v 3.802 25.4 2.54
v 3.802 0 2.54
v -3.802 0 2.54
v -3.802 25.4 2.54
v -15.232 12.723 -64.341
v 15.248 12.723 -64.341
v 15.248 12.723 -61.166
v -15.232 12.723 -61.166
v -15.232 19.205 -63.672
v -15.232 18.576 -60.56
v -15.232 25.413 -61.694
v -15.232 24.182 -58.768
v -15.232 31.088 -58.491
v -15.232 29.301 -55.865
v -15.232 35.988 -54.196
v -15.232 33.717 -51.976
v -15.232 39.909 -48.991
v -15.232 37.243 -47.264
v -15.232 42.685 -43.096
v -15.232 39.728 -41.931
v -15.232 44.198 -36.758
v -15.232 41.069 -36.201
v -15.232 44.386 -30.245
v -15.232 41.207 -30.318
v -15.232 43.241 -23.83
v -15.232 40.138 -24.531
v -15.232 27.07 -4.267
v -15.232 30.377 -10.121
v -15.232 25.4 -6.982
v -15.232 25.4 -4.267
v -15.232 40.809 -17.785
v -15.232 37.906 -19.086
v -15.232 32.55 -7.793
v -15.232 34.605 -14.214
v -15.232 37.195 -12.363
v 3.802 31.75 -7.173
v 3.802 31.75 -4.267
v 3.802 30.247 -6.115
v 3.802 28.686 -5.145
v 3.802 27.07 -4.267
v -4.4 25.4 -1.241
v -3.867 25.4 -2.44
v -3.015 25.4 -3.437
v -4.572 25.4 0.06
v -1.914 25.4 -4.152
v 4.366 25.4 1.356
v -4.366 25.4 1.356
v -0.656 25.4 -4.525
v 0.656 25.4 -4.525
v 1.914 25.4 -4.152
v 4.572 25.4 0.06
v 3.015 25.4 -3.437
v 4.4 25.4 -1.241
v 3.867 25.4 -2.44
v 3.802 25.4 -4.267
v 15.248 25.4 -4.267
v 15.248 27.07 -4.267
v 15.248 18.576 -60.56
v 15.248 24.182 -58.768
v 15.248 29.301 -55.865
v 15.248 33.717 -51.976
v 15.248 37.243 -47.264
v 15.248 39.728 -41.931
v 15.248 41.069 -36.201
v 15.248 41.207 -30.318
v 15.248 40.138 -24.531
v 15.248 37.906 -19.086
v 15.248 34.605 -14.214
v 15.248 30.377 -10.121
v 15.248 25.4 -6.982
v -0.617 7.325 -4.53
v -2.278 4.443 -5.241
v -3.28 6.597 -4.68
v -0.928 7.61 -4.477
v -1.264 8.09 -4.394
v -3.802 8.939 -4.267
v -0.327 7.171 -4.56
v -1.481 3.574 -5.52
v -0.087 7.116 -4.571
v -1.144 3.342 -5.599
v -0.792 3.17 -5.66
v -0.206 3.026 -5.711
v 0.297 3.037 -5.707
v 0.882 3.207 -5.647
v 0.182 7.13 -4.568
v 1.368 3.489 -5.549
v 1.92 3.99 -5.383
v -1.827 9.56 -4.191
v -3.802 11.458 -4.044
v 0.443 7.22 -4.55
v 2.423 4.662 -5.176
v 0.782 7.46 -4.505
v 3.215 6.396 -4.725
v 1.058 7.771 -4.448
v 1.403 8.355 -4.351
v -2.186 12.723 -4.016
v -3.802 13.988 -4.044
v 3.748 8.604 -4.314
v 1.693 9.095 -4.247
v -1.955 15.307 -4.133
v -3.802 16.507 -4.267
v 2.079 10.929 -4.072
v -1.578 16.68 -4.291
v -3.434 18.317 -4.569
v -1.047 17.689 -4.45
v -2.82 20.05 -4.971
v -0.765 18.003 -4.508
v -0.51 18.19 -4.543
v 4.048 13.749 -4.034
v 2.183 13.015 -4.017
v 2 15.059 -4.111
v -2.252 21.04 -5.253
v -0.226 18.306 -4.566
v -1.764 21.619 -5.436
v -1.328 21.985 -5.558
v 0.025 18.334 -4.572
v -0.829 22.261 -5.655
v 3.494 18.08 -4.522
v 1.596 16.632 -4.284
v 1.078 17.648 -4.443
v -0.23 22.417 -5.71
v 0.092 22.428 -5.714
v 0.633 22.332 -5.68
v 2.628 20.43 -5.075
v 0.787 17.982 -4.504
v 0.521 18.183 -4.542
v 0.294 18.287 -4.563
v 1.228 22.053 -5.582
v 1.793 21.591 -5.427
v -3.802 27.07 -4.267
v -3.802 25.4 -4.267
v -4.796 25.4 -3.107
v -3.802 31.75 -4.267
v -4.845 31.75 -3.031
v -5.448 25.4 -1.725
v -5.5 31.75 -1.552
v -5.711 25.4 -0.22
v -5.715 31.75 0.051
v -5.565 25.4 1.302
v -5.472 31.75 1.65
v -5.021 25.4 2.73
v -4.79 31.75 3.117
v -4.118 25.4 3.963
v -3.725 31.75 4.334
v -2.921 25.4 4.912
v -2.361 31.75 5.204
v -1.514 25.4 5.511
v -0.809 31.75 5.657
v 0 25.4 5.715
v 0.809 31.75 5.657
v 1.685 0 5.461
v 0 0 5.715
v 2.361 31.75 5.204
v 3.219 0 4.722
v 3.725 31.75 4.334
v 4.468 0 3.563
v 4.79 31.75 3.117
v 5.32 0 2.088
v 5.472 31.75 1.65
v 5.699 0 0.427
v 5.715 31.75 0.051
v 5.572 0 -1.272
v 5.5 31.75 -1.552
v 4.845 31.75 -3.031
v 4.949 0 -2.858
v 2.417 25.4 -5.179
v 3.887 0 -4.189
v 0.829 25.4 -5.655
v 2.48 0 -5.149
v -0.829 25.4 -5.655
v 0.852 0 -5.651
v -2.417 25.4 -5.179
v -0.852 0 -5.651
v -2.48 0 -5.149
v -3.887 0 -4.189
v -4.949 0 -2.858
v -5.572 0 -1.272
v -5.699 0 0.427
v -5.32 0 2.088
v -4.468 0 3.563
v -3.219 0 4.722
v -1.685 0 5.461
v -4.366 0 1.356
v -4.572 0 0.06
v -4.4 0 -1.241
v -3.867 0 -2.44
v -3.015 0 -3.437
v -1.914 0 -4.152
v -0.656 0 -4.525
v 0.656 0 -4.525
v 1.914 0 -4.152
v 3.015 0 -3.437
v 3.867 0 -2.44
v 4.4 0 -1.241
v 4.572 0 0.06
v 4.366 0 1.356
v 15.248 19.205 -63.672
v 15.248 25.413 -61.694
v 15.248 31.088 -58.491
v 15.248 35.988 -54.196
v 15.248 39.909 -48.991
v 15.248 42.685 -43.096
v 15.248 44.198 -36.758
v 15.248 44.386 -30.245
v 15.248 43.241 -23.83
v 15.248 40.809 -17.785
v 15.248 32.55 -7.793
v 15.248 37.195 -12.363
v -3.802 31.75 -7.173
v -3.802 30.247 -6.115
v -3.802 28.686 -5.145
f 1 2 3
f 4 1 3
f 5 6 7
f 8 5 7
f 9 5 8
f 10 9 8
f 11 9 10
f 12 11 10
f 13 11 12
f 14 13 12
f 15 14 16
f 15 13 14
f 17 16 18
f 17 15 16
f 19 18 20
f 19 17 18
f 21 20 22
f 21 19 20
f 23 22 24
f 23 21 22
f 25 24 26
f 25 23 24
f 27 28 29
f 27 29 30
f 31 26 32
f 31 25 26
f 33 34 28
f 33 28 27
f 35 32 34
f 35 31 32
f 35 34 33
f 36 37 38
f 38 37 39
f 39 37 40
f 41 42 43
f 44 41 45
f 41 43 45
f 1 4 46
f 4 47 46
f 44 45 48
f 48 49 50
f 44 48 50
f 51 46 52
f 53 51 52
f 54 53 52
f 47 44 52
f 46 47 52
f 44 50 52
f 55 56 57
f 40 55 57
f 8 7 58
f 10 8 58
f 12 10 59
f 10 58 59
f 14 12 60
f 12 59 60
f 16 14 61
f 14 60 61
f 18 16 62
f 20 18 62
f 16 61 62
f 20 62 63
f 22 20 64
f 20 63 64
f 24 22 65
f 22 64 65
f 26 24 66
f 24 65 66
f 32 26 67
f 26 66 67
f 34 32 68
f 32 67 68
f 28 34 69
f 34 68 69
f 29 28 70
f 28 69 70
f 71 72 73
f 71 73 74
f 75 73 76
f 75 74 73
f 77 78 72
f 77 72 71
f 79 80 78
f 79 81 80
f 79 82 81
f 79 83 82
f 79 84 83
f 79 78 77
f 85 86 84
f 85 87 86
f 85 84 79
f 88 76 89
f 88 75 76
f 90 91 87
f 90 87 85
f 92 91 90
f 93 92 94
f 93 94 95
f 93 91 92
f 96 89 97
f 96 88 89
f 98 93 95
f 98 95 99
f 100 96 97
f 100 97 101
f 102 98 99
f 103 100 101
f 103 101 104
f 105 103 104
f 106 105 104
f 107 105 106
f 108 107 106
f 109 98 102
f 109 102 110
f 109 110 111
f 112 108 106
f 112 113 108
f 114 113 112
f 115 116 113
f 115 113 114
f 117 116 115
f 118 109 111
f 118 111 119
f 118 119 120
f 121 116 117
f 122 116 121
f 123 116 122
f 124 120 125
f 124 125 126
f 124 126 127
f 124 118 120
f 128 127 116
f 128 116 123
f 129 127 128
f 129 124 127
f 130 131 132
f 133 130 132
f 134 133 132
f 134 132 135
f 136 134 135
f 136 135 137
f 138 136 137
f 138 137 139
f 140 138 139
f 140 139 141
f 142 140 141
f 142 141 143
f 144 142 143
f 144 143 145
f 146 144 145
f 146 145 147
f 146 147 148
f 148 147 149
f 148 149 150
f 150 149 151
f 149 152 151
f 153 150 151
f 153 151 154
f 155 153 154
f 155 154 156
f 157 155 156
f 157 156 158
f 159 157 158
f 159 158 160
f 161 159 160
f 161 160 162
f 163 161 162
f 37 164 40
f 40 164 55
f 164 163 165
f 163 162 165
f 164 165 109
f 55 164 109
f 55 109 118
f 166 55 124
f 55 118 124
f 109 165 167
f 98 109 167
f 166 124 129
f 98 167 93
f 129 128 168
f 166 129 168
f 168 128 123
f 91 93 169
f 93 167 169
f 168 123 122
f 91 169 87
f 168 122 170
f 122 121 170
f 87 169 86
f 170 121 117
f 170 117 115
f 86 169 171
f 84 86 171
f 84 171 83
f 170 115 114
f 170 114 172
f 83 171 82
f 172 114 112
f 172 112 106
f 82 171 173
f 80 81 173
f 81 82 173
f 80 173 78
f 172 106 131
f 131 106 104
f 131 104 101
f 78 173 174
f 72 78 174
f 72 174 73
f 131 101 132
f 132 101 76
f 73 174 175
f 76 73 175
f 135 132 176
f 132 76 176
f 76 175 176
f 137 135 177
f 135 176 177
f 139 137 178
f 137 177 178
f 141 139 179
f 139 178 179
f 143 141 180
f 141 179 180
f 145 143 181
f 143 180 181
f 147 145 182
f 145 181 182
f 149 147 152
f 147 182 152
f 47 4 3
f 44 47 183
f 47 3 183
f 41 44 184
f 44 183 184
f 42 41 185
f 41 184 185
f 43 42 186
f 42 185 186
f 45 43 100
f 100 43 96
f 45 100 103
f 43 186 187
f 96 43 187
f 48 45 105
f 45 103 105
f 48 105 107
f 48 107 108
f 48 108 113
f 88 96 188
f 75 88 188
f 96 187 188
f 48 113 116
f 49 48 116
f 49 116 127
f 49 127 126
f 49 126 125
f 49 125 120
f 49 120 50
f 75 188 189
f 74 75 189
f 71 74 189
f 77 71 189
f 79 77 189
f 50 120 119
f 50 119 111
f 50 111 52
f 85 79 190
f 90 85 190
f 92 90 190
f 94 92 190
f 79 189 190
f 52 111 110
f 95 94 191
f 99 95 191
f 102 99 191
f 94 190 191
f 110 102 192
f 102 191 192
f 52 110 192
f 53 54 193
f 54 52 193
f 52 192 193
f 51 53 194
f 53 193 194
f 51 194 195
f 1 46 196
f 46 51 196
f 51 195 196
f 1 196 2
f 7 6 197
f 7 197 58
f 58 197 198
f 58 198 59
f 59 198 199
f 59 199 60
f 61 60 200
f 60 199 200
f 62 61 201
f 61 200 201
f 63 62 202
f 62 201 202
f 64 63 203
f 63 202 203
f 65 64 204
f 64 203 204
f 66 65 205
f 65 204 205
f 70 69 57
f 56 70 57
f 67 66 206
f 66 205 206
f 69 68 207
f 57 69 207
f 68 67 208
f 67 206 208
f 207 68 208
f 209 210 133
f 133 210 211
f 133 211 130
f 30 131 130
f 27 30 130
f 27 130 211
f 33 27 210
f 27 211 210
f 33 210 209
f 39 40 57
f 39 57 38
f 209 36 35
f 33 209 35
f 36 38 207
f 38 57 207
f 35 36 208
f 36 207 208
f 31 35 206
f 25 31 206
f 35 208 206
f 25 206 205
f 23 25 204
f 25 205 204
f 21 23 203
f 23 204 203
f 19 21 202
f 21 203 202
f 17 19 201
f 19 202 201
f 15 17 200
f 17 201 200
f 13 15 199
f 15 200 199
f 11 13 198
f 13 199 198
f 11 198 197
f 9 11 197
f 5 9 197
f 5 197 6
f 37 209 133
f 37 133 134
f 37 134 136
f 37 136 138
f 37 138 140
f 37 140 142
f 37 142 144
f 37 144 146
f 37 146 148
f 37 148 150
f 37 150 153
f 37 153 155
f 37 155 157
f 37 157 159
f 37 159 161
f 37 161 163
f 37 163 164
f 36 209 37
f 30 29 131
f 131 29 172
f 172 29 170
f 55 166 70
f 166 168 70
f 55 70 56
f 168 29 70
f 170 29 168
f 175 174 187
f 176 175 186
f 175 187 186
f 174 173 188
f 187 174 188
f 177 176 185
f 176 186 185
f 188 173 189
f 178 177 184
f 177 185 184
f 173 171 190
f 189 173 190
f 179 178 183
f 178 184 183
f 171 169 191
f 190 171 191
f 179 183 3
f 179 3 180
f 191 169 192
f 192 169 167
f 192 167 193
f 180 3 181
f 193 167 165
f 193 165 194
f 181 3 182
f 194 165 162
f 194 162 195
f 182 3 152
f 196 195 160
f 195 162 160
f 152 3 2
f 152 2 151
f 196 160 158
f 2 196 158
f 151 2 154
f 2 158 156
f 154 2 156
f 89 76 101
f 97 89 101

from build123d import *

# Parameters (mm, degrees)
SKETCH1_R                = 5.715
BOSS_EXTRUDE1_DEPTH      = 25.4
BOSS_EXTRUDE3_DEPTH      = 6.35
BOSS_EXTRUDE4_DEPTH      = 11.430000000000001
BOSS_EXTRUDE4_DEPTH_BACK = 19.05
CUT_EXTRUDE1_START       = -19.05
SKETCH5_R                = 28.575000000000006
CUT_EXTRUDE1_DEPTH       = 19.05


with BuildPart() as part:
    # Sketch1 → Boss-Extrude1 (new body)
    with BuildSketch(Plane(origin=(0, 0, 0), x_dir=(1, 0, 0), z_dir=(0, 1, 0))):
        with Locations(Location((0, 0, 0), (0, 0, 270))):
            Circle(SKETCH1_R)
        with BuildLine():
            Line((3.801523904962324, -2.54), (-3.801523904962324, -2.54))
            ThreePointArc((-3.8015239049623246, -2.5400000000000005), (-1.33e-15, 4.572000000000001), (3.801523904962326, -2.5399999999999983))
        make_face(mode=Mode.SUBTRACT)
    extrude(amount=BOSS_EXTRUDE1_DEPTH)

    # Sketch2 → Boss-Extrude3 (add)
    with BuildSketch(Plane(origin=(0, 25.4, 0), x_dir=(1, 0, 0), z_dir=(0, 1, 0))):
        with BuildLine():
            Line((3.801523904962324, -2.54), (-3.801523904962324, -2.54))
            ThreePointArc((-3.8015239049623246, -2.5400000000000005), (-4.572, 5.607e-14), (-3.801523904962262, 2.540000000000094))
            Line((-3.801523904962324, 2.540000000000111), (-3.801523904962324, 4.267275594568456))
            ThreePointArc((-3.801523904962365, 4.26727559456847), (-2.338323746098912, -5.214735569367823), (5.715, -1.4e-15))
            ThreePointArc((5.715, 0), (5.214735569367823, 2.338323746098912), (3.801523904962363, 4.267275594568472))
            Line((3.801523904962324, 4.267275594568458), (3.801523904962324, 2.5400000000001137))
            ThreePointArc((3.801523904962324, 2.540000000000001), (4.572000000000001, 1.44e-15), (3.801523904962326, -2.5399999999999983))
        make_face()
        with BuildLine():
            Line((-3.801523904962324, 2.540000000000111), (-3.801523904962324, -2.54))
            Line((-3.801523904962324, -2.54), (3.801523904962324, -2.54))
            Line((3.801523904962324, -2.54), (3.801523904962324, 2.5400000000001137))
            ThreePointArc((3.801523904962324, 2.540000000000001), (5.507e-14, 4.572000000000001), (-3.801523904962262, 2.540000000000094))
        make_face()
        with BuildLine():
            Line((-3.801523904962324, 32.590628837493085), (-3.801523904962324, 4.267275594568456))
            ThreePointArc((-3.801523904962365, 4.26727559456847), (-2.19e-15, 5.715), (3.801523904962363, 4.267275594568472))
            Line((3.801523904962324, 4.267275594568458), (3.801523904962324, 32.590628837493085))
            Line((3.801523904962324, 32.590628837493085), (-3.801523904962324, 32.590628837493085))
        make_face()
        with BuildLine():
            Line((-3.801523904962324, 4.267275594568456), (-3.801523904962324, 2.540000000000111))
            ThreePointArc((-3.801523904962262, 2.540000000000094), (5.507e-14, 4.572000000000001), (3.801523904962324, 2.540000000000001))
            Line((3.801523904962324, 2.5400000000001137), (3.801523904962324, 4.267275594568458))
            ThreePointArc((3.801523904962363, 4.267275594568472), (-2.19e-15, 5.715), (-3.801523904962365, 4.26727559456847))
        make_face()
        with BuildLine():
            ThreePointArc((-3.801523904962262, 2.540000000000094), (-4.572, 5.607e-14), (-3.8015239049623246, -2.5400000000000005))
            Line((-3.801523904962324, -2.54), (-3.801523904962324, 2.540000000000111))
        make_face()
        with BuildLine():
            Line((3.801523904962324, 2.5400000000001137), (3.801523904962324, -2.54))
            ThreePointArc((3.801523904962326, -2.5399999999999983), (4.572000000000001, 1.44e-15), (3.801523904962324, 2.540000000000001))
        make_face()
    extrude(amount=BOSS_EXTRUDE3_DEPTH)

    # Sketch4 → Boss-Extrude4 (add, two sides: drawn at the far end of the back side and taken through both)
    with BuildSketch(Plane.ZY.offset(3.801523904962324).offset(-BOSS_EXTRUDE4_DEPTH_BACK)):
        with BuildLine():
            Line((-64.34062883749309, 12.723017723708097), (-61.16562883749309, 12.723017723708097))
            ThreePointArc((-61.16562883749309, 12.7230177237081), (-42.772401198467776, 39.4224959318921), (-11.27151604034228, 31.75000000000092))
            Line((-11.271516040342593, 31.75), (-7.173381829650392, 31.75))
            ThreePointArc((-7.173381829650484, 31.74999999999974), (-42.61721618067714, 42.8482570795954), (-64.34062883749309, 12.7230177237081))
        make_face()
        with BuildLine():
            Line((-7.173381829650392, 31.75), (-11.271516040342593, 31.75))
            ThreePointArc((-11.27151604034228, 31.75000000000092), (-8.912699493419062, 28.719463797040717), (-6.981553388219599, 25.39999999999997))
            Line((-6.9815533882195915, 25.4), (-4.267275594568506, 25.4))
            Line((-4.267275594568505, 25.4), (-4.267275594568505, 27.07049698232741))
            ThreePointArc((-4.267275594568467, 27.07049698232742), (-5.618653271152166, 29.473391870237137), (-7.173381829650484, 31.74999999999974))
        make_face()
    extrude(amount=BOSS_EXTRUDE4_DEPTH + BOSS_EXTRUDE4_DEPTH_BACK)

    # Sketch5 → Cut-Extrude1 (cut)
    with BuildSketch(Plane.ZY.offset(3.801523904962324).offset(CUT_EXTRUDE1_START)):
        with Locations((-32.590628837493085, 12.723017723708097)):
            Circle(SKETCH5_R)
    extrude(amount=CUT_EXTRUDE1_DEPTH, mode=Mode.SUBTRACT)


solid = part.part
